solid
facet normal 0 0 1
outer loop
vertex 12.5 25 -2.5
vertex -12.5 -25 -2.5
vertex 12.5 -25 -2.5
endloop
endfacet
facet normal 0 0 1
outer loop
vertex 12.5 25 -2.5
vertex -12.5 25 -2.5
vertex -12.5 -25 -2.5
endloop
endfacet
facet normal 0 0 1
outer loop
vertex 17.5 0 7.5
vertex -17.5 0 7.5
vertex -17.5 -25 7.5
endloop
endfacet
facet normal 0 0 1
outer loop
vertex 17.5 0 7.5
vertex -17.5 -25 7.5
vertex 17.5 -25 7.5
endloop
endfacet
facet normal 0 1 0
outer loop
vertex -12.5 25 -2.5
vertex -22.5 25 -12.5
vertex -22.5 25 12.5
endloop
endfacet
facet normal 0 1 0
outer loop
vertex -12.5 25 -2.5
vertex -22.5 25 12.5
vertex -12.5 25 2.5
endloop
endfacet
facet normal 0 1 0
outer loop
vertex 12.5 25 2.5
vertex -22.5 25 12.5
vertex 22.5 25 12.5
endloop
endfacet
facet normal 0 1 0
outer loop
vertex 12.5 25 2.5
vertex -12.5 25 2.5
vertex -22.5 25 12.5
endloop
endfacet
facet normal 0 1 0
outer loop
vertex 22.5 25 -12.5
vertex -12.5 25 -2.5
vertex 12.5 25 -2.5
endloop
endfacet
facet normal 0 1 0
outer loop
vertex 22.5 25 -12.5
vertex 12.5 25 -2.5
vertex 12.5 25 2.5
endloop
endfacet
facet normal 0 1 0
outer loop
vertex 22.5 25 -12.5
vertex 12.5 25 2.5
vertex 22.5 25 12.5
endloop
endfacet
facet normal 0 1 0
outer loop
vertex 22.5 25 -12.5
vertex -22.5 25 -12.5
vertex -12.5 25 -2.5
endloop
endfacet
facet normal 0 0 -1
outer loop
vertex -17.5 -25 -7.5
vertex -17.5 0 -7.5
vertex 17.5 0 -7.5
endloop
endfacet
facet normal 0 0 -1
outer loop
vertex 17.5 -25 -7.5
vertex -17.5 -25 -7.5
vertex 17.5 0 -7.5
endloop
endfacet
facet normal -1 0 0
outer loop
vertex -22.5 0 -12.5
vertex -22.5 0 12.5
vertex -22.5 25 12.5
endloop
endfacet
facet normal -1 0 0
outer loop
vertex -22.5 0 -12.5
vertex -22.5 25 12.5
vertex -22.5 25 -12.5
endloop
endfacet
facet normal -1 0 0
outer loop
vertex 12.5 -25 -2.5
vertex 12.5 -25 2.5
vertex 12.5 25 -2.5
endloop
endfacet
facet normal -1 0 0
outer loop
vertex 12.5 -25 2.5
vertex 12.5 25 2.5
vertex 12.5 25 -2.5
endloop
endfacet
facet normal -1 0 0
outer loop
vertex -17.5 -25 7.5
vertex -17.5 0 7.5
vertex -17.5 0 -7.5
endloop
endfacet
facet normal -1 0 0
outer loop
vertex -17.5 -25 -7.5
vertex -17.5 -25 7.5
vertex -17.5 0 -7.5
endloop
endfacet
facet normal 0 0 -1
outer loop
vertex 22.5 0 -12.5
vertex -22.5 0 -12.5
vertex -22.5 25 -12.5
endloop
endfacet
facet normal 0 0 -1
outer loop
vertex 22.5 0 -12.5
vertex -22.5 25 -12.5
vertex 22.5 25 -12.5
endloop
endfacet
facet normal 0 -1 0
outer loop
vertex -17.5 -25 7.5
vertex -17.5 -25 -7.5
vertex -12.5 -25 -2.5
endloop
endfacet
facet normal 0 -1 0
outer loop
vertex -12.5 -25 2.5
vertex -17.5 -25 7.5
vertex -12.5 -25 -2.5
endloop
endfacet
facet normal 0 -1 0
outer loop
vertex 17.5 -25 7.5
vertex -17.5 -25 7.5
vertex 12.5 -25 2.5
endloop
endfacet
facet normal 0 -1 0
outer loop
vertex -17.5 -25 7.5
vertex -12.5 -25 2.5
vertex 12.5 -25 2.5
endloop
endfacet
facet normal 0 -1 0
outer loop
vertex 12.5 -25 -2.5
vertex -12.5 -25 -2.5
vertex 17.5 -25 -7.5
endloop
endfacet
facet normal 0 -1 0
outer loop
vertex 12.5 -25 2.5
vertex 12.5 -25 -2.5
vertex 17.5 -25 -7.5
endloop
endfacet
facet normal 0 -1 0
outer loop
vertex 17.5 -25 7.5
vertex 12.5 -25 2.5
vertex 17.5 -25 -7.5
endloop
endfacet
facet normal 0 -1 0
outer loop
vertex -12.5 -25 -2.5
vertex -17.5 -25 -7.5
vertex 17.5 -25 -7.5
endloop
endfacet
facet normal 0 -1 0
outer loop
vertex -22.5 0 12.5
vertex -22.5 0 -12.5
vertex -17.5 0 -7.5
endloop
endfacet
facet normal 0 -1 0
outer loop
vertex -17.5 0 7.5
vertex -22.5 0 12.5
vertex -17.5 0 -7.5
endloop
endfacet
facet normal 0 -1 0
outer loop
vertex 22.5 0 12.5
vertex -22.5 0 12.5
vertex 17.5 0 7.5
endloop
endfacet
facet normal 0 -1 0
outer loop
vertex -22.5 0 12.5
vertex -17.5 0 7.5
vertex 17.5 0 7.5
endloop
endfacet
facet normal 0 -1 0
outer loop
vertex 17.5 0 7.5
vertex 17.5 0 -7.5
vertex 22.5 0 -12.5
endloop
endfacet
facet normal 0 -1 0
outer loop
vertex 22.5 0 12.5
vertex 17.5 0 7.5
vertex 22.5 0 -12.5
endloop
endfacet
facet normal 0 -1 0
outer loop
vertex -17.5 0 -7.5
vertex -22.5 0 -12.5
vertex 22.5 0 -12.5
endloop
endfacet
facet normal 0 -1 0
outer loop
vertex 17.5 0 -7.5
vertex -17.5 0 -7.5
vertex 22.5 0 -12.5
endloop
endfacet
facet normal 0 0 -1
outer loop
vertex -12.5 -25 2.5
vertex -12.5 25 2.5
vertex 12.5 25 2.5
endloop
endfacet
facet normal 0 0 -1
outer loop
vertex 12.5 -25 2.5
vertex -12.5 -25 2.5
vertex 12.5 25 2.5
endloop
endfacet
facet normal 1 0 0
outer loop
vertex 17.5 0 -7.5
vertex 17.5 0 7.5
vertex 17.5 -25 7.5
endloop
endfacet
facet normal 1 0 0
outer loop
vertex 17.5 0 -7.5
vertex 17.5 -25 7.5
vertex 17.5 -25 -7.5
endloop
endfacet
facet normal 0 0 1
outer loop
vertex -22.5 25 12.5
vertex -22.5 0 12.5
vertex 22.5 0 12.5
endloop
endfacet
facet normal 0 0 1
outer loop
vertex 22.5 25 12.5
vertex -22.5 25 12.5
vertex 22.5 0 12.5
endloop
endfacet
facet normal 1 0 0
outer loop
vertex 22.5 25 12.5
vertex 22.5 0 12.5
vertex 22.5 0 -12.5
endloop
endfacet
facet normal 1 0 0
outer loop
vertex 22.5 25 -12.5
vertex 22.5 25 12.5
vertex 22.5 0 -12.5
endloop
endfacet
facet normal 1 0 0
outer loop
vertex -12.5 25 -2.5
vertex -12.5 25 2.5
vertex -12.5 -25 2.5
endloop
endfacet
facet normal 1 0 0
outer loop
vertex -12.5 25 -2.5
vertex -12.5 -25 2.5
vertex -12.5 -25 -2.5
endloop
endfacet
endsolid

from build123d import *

# Parameters (mm, degrees)
SKETCH1_W           = 45
SKETCH1_H           = 25
SKETCH1_W_2         = 25
SKETCH1_H_2         = 5
BOSS_EXTRUDE1_DEPTH = 25
SKETCH1_3_W         = 35
SKETCH1_3_H         = 15
SKETCH1_3_W_2       = 25
SKETCH1_3_H_2       = 5
BOSS_EXTRUDE2_DEPTH = 25


with BuildPart() as part:
    # Sketch1 → Boss-Extrude1 (new body)
    with BuildSketch(Plane(origin=(0, 0, 0), x_dir=(1, 0, 0), z_dir=(0, 1, 0))):
        Rectangle(SKETCH1_W, SKETCH1_H)
        Rectangle(SKETCH1_W_2, SKETCH1_H_2, mode=Mode.SUBTRACT)
    extrude(amount=BOSS_EXTRUDE1_DEPTH)

    # Sketch1<3> → Boss-Extrude2 (add)
    with BuildSketch(Plane(origin=(0, 0, 0), x_dir=(1, 0, 0), z_dir=(0, 1, 0))):
        Rectangle(SKETCH1_3_W, SKETCH1_3_H)
        Rectangle(SKETCH1_3_W_2, SKETCH1_3_H_2, mode=Mode.SUBTRACT)
    extrude(amount=-BOSS_EXTRUDE2_DEPTH)


solid = part.part
